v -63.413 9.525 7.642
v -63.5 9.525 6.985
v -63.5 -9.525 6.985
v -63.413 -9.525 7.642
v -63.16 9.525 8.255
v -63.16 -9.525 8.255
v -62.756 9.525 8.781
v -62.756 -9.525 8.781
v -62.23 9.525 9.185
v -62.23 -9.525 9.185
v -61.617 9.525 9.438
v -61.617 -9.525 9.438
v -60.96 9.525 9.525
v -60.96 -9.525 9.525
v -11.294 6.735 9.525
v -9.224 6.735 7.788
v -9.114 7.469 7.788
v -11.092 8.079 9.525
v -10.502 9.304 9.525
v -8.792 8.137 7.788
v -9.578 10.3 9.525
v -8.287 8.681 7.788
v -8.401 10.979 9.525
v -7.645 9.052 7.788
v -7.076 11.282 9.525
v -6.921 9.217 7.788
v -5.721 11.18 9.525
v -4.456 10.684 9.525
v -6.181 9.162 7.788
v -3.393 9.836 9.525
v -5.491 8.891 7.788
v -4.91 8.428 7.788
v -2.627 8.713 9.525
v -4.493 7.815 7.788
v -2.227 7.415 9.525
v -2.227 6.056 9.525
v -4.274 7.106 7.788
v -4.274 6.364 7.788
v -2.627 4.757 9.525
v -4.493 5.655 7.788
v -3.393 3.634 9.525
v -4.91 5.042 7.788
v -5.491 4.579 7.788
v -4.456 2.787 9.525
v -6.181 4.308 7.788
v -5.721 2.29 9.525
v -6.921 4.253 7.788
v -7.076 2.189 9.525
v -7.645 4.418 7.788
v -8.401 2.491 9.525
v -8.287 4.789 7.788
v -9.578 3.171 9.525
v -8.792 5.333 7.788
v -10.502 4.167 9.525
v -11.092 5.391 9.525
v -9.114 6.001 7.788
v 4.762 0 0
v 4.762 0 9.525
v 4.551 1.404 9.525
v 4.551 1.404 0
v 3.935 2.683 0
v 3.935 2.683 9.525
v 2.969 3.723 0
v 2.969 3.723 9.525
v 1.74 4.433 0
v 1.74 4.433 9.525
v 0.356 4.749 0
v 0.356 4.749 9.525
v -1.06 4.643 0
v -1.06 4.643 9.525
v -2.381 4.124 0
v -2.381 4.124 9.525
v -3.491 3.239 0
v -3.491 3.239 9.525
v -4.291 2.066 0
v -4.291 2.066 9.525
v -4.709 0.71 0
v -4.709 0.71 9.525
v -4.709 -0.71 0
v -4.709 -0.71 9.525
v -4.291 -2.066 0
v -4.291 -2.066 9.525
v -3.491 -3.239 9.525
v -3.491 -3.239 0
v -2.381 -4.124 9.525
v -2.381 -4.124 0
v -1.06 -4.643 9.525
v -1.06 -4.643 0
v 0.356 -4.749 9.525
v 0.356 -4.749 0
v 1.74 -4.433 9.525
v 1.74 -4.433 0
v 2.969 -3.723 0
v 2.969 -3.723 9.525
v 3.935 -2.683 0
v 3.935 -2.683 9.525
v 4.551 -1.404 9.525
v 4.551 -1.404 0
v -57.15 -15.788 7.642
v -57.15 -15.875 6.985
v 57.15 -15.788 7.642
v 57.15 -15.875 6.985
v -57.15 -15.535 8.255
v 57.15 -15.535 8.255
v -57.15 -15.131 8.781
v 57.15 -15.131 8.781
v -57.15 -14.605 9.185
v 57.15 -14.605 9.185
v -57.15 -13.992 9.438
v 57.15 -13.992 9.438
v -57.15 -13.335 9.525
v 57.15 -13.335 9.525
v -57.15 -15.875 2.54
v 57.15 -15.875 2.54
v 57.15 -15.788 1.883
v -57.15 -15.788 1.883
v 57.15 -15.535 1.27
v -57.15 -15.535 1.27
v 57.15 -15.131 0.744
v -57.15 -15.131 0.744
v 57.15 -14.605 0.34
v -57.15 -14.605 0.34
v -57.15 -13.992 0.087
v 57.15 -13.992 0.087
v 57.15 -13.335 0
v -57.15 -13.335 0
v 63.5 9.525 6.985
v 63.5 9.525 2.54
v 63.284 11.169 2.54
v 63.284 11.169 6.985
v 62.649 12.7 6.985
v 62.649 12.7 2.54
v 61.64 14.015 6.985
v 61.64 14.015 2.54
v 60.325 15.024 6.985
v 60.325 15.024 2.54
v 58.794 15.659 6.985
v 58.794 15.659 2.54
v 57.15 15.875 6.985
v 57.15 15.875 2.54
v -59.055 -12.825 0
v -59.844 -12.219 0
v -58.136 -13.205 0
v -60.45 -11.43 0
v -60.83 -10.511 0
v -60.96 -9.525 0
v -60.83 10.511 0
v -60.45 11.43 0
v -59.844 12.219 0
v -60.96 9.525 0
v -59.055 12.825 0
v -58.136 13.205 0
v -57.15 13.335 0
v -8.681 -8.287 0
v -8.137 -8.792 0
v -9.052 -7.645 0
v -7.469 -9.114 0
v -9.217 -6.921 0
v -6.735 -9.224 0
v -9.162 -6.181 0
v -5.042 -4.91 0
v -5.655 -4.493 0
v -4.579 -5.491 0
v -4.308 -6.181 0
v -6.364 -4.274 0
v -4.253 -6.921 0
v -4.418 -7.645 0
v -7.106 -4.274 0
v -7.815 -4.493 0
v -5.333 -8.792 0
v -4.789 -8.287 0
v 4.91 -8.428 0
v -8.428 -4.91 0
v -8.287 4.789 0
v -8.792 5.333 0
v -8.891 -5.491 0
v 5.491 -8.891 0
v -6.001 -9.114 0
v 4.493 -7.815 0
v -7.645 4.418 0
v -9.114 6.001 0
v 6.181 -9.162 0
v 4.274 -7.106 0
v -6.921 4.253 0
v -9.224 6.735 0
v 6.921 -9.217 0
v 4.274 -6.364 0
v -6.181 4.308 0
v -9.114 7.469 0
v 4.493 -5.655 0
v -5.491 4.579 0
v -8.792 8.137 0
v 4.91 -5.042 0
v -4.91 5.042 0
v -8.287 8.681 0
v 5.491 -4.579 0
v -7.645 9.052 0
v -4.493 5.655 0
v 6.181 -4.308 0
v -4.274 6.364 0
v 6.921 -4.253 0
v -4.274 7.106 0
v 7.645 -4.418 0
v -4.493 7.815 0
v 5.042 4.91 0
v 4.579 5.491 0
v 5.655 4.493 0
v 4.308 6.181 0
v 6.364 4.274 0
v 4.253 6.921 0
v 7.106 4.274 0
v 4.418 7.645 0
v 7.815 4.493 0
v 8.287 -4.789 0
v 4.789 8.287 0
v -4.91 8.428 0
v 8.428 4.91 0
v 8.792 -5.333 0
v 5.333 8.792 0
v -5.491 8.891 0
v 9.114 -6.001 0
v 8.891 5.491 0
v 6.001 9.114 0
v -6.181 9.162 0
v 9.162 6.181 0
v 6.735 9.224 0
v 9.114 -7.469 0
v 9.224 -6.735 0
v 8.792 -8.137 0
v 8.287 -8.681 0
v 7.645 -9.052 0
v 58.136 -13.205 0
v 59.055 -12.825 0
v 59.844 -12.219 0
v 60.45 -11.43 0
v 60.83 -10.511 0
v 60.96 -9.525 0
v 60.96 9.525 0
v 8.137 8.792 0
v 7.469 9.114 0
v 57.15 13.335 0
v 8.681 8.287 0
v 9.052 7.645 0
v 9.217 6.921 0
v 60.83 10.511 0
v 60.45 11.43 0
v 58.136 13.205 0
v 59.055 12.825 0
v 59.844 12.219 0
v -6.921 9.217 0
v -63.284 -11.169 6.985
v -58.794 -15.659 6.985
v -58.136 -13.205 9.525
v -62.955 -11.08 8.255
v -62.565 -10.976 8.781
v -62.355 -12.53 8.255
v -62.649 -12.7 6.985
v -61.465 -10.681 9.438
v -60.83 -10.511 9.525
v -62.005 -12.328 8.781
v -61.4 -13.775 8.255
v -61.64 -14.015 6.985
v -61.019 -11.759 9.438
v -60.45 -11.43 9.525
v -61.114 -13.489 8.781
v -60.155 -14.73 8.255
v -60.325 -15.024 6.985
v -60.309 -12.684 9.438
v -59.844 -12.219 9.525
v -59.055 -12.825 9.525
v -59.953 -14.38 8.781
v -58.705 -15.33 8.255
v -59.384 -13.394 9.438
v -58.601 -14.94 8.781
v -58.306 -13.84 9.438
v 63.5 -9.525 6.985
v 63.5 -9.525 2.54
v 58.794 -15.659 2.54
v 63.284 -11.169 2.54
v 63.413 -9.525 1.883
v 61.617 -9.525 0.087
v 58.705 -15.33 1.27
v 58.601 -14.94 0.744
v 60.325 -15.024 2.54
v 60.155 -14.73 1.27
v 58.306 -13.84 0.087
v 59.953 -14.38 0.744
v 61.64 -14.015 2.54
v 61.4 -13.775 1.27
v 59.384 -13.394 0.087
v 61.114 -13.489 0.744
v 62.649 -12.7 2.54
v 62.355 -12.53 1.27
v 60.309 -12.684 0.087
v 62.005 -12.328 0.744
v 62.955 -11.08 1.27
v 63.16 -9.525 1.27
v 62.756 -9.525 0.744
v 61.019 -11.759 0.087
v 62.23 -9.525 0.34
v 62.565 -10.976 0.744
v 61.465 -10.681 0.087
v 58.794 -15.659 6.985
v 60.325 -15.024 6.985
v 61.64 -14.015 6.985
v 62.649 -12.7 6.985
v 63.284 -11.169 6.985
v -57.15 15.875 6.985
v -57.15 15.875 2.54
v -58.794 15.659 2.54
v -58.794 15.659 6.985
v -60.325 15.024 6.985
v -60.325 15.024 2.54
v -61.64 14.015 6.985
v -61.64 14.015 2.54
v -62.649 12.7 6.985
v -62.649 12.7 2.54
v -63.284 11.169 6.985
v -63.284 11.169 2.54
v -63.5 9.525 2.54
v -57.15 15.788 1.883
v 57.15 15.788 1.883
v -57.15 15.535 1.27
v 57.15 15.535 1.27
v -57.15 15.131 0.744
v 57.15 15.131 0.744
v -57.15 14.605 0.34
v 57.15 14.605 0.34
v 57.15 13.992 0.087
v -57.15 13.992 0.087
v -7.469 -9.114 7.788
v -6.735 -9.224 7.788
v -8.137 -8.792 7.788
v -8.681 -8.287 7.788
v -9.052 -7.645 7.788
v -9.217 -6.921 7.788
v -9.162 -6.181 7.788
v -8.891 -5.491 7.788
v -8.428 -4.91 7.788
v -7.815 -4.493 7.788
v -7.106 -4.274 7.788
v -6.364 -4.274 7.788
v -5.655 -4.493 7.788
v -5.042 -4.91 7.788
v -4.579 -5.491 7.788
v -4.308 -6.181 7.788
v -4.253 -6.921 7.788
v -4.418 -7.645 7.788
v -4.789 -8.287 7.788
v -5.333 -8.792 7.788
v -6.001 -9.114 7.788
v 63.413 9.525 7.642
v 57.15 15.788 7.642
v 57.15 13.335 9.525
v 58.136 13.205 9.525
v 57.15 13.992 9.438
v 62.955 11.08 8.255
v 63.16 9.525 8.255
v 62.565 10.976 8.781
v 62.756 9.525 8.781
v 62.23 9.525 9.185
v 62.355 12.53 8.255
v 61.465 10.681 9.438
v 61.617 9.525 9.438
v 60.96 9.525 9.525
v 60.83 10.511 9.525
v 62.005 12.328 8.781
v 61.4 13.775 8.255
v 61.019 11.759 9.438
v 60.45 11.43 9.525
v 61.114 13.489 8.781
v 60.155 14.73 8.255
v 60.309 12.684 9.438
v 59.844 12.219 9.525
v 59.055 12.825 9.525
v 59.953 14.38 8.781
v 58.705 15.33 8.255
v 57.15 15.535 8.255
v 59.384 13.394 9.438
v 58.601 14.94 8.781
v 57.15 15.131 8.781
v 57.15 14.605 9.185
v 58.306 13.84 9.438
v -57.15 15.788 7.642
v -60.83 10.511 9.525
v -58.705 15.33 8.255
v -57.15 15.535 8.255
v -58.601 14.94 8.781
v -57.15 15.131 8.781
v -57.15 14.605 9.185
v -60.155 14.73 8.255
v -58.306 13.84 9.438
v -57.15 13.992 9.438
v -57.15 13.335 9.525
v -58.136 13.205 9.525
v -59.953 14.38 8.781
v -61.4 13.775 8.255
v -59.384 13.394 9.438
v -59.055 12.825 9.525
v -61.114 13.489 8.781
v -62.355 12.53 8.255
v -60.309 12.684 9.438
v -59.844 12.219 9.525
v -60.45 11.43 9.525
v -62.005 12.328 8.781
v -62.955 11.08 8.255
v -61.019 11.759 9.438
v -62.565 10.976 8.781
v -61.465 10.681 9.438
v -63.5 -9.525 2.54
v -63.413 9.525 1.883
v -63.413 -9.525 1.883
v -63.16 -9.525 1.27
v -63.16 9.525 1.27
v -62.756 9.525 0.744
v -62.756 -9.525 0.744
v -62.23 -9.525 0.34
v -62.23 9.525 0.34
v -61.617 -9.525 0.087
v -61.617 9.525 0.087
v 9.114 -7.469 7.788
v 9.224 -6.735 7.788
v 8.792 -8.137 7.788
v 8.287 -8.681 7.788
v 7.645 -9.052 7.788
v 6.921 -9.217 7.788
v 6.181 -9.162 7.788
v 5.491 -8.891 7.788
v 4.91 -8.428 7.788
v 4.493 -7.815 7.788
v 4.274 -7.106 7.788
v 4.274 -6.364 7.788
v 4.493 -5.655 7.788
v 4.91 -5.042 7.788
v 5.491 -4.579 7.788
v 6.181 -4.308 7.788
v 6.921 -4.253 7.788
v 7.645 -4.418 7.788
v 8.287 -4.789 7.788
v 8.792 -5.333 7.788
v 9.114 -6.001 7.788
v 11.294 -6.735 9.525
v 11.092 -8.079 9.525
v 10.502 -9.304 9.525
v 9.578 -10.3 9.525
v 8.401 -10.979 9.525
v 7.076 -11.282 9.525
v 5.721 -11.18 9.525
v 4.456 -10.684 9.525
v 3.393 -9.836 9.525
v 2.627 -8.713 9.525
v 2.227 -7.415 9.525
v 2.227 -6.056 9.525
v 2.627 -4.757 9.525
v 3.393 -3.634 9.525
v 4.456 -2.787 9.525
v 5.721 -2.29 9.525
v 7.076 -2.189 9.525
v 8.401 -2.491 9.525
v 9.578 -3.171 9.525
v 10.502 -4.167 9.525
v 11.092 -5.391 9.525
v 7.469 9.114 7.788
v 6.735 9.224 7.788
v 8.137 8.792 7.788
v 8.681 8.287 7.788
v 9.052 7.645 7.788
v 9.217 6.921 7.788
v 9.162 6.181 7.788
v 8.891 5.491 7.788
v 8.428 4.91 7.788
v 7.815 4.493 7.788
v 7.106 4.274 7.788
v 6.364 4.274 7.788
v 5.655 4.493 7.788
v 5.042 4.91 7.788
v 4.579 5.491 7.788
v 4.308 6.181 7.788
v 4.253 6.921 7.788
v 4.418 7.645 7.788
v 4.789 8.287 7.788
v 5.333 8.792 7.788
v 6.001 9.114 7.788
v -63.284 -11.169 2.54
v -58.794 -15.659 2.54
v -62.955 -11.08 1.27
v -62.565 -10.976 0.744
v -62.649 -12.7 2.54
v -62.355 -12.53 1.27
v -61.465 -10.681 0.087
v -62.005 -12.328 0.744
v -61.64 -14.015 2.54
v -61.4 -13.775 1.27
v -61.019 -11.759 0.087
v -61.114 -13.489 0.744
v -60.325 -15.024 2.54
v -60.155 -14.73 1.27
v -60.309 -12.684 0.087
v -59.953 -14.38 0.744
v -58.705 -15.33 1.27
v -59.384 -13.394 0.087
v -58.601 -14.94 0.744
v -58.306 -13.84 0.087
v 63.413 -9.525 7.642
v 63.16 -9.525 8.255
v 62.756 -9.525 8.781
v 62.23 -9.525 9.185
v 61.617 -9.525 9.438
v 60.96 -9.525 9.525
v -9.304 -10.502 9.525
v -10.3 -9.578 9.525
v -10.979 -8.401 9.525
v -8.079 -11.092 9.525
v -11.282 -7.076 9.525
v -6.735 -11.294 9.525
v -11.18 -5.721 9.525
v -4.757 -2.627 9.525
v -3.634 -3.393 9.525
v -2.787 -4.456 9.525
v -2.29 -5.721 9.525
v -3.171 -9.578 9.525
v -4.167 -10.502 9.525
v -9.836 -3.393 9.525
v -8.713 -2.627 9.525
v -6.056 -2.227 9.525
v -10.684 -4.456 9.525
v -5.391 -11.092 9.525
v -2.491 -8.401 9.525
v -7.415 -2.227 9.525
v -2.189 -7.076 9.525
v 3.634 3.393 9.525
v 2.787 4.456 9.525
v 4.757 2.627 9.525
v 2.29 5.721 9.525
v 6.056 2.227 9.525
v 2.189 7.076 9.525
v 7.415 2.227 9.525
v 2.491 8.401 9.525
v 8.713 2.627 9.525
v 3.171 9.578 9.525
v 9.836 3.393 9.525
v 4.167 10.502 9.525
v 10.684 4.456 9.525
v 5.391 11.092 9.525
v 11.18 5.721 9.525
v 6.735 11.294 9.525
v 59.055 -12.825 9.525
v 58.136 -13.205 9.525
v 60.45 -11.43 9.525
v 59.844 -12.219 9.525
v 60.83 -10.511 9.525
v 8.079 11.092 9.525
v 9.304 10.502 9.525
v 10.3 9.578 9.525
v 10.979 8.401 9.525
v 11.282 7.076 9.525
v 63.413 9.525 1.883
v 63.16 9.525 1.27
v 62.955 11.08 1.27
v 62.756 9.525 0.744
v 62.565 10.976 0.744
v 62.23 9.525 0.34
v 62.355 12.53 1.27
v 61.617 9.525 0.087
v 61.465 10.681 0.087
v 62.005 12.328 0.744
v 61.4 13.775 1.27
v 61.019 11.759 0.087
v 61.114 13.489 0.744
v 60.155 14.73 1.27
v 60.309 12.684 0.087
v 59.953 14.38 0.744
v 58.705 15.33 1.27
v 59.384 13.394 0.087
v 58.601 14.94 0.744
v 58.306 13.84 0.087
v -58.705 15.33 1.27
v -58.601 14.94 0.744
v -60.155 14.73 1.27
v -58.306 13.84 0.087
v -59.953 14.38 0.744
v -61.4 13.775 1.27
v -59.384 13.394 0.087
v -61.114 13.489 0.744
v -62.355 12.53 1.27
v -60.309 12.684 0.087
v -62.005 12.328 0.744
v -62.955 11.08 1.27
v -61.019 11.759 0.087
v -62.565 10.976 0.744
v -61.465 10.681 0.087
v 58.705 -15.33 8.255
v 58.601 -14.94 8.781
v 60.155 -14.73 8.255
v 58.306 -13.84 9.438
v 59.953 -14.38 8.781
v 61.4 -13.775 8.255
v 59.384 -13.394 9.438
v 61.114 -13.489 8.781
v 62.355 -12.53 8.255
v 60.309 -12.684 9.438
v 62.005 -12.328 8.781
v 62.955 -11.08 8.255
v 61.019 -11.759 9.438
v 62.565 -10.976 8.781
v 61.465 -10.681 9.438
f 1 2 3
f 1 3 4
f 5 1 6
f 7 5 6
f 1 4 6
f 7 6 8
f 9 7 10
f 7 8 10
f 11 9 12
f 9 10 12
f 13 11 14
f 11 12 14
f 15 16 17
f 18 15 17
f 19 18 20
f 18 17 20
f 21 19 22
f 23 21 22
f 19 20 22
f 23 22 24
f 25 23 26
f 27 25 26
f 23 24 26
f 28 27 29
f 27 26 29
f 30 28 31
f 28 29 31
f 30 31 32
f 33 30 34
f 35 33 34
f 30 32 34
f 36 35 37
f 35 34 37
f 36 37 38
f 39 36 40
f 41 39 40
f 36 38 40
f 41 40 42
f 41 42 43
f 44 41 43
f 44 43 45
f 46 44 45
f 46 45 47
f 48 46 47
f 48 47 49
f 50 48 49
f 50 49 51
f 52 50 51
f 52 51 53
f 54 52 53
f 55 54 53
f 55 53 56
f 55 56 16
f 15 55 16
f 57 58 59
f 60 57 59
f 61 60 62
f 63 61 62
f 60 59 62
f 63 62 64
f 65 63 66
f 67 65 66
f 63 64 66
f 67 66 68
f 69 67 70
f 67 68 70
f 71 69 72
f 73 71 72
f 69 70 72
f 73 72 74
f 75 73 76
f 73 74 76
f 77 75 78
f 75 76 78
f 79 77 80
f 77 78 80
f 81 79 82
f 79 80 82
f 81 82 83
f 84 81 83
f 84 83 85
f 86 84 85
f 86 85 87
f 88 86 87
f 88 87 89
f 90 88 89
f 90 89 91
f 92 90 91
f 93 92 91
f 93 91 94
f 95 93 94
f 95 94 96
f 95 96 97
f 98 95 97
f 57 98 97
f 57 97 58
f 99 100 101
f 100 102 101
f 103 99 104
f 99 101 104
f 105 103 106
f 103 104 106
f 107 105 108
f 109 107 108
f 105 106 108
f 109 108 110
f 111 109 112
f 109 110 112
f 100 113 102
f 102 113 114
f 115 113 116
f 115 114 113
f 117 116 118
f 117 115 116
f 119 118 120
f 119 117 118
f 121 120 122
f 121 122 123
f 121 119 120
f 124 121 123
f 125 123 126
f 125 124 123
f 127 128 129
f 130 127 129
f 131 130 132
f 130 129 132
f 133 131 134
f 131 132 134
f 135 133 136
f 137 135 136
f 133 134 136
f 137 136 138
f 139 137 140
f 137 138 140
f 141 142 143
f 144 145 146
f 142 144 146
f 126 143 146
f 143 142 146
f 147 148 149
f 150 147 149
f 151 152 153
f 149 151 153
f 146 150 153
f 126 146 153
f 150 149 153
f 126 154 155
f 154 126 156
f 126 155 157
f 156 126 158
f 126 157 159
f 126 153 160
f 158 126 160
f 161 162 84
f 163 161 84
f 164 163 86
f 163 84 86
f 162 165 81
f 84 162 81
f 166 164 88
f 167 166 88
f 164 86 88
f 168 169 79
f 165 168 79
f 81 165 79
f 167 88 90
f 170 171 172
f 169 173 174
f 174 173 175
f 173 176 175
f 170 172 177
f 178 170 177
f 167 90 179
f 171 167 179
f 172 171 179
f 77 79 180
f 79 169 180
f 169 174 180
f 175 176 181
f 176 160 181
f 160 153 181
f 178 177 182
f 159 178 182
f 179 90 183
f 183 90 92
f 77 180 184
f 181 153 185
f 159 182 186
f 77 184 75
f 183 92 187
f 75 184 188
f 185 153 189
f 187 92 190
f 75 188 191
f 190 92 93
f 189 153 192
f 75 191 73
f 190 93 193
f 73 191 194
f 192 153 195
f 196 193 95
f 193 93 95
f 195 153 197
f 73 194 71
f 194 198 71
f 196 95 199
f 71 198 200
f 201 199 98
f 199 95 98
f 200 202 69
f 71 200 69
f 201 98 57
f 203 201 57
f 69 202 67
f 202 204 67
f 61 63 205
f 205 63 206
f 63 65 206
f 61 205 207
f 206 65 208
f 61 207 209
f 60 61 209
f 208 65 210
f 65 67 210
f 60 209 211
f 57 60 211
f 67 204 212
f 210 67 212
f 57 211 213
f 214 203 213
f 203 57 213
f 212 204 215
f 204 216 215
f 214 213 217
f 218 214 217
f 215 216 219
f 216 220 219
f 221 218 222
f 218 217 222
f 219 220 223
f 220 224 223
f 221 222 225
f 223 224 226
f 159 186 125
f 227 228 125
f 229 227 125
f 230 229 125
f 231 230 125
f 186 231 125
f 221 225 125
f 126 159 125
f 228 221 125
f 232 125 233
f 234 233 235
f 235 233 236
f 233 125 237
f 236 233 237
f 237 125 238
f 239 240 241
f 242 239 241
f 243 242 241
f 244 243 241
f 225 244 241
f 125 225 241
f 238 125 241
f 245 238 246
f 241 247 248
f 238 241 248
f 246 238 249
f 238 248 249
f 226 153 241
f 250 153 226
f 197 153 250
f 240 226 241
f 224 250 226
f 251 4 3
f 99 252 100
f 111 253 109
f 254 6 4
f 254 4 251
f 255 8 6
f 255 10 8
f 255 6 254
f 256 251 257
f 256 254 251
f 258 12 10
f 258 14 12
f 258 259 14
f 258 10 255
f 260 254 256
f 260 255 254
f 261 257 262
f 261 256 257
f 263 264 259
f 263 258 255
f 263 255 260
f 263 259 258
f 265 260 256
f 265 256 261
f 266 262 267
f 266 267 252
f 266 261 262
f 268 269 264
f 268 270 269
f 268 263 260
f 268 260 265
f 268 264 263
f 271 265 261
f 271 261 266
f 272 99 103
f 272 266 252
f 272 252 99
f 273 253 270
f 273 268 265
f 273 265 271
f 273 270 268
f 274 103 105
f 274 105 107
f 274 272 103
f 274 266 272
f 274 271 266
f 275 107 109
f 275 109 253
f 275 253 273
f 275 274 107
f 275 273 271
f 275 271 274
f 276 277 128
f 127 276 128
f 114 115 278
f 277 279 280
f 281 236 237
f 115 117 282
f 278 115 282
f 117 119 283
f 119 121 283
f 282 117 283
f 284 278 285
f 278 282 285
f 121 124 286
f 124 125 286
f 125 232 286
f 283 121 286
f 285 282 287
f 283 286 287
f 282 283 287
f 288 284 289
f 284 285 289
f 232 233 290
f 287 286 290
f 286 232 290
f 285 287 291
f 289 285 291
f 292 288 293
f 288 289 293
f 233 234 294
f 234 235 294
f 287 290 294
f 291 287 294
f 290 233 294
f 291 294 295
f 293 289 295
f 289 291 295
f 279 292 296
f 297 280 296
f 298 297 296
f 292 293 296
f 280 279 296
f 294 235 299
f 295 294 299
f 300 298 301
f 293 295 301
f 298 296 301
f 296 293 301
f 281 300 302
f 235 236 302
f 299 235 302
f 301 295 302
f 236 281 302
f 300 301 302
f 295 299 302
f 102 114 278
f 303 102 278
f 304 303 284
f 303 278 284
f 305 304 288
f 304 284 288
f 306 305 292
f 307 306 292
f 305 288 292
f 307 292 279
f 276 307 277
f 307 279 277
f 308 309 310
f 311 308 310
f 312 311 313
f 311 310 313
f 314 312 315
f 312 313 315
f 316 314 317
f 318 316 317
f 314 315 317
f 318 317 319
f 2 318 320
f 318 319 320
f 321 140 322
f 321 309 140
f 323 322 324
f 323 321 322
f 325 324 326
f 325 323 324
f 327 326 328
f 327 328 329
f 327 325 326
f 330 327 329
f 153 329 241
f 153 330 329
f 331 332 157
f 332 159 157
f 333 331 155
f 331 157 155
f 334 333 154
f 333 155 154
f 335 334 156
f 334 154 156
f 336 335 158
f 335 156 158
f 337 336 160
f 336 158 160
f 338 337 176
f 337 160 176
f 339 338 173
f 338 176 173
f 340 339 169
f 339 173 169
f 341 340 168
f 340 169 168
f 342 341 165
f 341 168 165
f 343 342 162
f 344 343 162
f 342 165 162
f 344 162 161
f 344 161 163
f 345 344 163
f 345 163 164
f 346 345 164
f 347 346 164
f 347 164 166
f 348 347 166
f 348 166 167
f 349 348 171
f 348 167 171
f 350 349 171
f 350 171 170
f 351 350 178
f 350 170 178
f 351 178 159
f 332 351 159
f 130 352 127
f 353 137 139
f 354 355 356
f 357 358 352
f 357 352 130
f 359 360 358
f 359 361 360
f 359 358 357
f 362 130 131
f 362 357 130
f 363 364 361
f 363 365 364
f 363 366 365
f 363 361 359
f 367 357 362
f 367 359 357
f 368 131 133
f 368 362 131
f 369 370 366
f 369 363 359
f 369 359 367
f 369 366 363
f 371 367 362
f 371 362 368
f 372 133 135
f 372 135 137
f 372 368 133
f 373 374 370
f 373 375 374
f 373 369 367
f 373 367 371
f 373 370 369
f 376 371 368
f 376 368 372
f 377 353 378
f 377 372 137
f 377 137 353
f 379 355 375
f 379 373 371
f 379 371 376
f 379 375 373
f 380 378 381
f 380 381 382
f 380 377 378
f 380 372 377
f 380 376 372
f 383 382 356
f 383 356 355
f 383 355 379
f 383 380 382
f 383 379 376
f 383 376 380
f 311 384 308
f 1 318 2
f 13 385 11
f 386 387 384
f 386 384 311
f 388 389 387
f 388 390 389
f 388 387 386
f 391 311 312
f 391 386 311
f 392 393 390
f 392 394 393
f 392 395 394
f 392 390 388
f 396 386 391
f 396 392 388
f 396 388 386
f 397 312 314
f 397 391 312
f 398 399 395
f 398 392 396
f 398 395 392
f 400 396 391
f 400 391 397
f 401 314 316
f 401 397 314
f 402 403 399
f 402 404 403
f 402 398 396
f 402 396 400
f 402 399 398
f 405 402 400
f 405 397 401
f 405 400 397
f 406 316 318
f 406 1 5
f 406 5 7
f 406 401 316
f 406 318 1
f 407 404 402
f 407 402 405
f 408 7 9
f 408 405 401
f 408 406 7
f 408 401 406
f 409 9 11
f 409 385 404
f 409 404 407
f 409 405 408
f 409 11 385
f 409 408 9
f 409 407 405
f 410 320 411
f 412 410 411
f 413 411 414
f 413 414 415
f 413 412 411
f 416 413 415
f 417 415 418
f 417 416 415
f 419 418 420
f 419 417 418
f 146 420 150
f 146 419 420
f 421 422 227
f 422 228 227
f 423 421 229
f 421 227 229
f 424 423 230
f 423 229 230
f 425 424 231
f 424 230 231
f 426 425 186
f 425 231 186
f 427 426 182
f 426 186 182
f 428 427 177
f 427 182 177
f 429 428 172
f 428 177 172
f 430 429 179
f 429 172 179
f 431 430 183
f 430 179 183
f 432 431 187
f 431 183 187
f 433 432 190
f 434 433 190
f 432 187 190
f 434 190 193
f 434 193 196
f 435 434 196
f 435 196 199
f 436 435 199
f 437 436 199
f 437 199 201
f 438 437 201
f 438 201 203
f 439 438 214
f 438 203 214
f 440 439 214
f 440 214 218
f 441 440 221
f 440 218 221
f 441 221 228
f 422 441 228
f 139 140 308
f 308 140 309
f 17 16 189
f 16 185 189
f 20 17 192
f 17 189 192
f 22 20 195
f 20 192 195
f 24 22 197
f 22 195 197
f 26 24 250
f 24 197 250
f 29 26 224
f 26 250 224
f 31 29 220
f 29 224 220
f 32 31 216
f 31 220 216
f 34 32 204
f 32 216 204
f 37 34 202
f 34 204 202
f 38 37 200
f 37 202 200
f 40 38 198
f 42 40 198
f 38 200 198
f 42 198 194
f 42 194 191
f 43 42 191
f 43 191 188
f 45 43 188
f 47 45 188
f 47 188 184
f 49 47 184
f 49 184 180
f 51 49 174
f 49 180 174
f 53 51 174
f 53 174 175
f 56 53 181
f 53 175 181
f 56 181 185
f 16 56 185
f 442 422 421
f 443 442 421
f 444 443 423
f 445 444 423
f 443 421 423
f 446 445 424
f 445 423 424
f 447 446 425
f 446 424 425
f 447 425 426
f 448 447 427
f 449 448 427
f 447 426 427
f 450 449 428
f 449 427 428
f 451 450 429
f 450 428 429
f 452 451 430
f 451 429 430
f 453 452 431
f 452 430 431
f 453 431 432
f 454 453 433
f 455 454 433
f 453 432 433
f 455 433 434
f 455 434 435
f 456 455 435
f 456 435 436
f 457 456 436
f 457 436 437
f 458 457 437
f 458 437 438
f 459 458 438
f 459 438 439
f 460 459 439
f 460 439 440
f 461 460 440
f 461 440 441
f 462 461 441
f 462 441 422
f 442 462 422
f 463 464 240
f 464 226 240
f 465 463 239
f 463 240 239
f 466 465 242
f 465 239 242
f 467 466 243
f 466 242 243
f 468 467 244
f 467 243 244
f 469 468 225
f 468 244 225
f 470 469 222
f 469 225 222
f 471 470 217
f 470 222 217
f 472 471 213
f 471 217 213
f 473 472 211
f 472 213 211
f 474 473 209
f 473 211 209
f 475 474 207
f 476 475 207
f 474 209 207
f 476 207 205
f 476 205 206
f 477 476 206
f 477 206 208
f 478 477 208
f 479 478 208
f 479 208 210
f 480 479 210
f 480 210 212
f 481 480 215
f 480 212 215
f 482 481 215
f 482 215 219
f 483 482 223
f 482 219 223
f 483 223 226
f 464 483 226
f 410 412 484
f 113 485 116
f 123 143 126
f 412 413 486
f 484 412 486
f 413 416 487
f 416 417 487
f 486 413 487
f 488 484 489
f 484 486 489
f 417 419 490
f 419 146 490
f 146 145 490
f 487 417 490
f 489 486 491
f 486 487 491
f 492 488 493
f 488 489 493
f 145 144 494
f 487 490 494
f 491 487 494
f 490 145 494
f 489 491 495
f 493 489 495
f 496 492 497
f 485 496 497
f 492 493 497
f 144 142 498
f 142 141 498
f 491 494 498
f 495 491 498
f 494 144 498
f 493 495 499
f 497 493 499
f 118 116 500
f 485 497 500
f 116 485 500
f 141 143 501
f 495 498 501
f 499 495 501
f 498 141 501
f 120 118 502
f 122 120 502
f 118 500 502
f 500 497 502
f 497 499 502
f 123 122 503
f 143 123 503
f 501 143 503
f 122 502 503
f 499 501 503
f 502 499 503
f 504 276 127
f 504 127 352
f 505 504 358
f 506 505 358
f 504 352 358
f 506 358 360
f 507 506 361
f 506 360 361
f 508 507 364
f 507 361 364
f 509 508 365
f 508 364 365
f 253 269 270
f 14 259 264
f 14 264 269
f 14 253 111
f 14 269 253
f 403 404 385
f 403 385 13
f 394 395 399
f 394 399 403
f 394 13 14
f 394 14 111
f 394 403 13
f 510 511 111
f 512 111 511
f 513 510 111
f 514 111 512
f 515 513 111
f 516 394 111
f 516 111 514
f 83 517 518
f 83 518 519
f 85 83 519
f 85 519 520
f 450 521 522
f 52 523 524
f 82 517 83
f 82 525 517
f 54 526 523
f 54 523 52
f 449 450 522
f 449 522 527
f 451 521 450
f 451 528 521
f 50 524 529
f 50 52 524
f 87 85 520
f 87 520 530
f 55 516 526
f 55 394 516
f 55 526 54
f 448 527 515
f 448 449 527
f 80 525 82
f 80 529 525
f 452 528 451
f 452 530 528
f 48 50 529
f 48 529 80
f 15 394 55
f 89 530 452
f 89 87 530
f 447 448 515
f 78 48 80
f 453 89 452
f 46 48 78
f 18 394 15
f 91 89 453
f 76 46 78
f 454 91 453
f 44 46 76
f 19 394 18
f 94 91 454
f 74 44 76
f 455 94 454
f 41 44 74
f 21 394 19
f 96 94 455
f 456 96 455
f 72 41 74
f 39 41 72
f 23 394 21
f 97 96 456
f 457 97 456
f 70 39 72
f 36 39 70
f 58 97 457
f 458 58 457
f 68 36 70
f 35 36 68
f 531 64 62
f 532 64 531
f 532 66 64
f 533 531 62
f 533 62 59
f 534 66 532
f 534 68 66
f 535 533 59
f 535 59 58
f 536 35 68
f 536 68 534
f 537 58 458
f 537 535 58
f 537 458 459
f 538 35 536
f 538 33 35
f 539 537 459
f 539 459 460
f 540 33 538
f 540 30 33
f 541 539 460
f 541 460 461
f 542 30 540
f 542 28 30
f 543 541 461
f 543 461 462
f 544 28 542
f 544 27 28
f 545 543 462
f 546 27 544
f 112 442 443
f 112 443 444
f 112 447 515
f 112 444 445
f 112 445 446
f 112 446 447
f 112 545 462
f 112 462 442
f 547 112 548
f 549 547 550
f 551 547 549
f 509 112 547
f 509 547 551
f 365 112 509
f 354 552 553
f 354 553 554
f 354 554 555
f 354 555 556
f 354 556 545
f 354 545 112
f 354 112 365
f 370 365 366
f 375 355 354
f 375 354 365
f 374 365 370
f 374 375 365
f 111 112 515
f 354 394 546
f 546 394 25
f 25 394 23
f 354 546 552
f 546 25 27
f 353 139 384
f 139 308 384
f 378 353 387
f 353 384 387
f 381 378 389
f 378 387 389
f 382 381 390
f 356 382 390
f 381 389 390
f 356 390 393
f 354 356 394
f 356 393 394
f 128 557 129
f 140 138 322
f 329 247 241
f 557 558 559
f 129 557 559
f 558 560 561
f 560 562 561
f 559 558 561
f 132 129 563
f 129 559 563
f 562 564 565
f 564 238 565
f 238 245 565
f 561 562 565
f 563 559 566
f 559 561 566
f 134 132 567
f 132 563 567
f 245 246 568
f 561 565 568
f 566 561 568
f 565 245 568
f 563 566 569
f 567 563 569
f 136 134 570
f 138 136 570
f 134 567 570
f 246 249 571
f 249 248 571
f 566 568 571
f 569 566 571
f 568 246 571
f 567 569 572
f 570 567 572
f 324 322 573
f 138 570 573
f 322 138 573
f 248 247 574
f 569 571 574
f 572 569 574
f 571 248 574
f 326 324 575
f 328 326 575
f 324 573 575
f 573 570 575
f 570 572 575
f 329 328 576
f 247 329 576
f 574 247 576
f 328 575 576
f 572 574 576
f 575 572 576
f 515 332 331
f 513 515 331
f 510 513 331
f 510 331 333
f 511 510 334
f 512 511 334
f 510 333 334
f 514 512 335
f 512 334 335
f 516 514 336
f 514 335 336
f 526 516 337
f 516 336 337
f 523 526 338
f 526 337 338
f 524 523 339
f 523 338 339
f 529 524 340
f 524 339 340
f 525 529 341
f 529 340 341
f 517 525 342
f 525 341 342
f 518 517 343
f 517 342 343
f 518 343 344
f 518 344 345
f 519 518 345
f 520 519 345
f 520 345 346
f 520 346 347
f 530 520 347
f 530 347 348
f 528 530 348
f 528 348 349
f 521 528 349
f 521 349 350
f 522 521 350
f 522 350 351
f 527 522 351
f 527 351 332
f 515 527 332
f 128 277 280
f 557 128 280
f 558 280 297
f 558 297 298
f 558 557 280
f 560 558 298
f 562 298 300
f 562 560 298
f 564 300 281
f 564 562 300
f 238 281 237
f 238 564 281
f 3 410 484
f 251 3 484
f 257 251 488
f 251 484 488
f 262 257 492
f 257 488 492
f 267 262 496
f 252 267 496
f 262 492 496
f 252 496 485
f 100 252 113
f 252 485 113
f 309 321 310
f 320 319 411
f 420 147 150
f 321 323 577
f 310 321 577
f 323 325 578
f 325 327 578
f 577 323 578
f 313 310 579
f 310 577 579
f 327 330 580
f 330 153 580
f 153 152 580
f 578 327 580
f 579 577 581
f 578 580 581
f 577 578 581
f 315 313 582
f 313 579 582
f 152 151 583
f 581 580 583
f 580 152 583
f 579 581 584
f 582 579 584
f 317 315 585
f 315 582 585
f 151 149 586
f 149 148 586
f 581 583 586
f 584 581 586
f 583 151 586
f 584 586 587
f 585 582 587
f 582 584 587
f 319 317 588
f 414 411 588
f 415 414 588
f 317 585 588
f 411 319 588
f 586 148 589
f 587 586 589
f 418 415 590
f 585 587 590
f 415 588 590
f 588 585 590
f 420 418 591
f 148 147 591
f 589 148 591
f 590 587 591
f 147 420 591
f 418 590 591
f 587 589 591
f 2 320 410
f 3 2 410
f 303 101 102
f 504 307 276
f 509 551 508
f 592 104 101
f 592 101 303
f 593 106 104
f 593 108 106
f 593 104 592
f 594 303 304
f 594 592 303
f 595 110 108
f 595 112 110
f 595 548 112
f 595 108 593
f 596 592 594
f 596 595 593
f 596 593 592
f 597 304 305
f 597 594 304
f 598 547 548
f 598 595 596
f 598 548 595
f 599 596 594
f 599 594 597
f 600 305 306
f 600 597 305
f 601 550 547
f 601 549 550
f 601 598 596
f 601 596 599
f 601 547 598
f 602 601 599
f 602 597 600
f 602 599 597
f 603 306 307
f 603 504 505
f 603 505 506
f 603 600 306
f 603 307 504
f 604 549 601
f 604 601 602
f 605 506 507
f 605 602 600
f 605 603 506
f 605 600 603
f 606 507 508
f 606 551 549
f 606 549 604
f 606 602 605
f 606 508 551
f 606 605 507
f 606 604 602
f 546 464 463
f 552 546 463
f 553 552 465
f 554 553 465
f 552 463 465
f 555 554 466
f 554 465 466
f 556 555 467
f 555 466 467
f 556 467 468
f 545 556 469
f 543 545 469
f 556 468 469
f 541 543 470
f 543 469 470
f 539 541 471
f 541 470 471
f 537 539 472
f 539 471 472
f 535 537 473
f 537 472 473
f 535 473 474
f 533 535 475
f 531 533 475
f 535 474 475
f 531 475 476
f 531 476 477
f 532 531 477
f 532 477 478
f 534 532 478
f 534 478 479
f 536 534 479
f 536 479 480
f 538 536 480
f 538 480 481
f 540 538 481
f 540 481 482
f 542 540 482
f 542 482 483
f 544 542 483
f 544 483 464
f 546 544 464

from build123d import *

# Parameters (mm, degrees)
F1_DEPTH        = 9.525
F2_R            = 2.54
F3_R            = 4.7625
F4_DEPTH        = 25.4
F6_D            = 4.9784
F6_CSINK_D      = 9.1186
F6_CSINK_ANGLE  = 100
F6_COPIES_COUNT = 4


# Not quite as in the source:
# - a pattern or mirror of a feature is missing from the dataset's text; its kind, count and spacing are read off the source's solid


with BuildPart() as f1:
    # F0 (on Top) → F1 (new body)
    with BuildSketch(Plane.XY):
        with BuildLine():
            Line((-57.15, -15.875), (57.15, -15.875))
            ThreePointArc((57.15, -15.875), (61.6401280605, -14.0151280605), (63.5, -9.525))
            Line((63.5, -9.525), (63.5, 9.525))
            ThreePointArc((63.5, 9.525), (61.6401280605, 14.0151280605), (57.15, 15.875))
            Line((57.15, 15.875), (-57.15, 15.875))
            ThreePointArc((-57.15, 15.875), (-61.6401280605, 14.0151280605), (-63.5, 9.525))
            Line((-63.5, 9.525), (-63.5, -9.525))
            ThreePointArc((-63.5, -9.525), (-61.6401280605, -14.0151280605), (-57.15, -15.875))
        make_face()
    extrude(amount=F1_DEPTH)

    # F2
    f2_edges = [f1.edges().sort_by_distance(p)[0] for p in [
        (0, -15.875, 9.525),
        (61.640128, -14.015128, 9.525),
        (63.5, 0, 9.525),
        (61.640128, 14.015128, 9.525),
        (0, 15.875, 9.525),
        (-61.640128, 14.015128, 9.525),
        (-63.5, 0, 9.525),
        (-61.640128, -14.015128, 9.525),
        (0, -15.875, 0),
        (61.640128, -14.015128, 0),
        (63.5, 0, 0),
        (61.640128, 14.015128, 0),
        (0, 15.875, 0),
        (-61.640128, 14.015128, 0),
        (-63.5, 0, 0),
        (-61.640128, -14.015128, 0),
    ]]
    fillet(f2_edges, radius=F2_R)

    # F3 (on face) → F4 (cut)
    with BuildSketch(Plane.XY.offset(9.525)):
        Circle(F3_R)
    extrude(amount=-F4_DEPTH, mode=Mode.SUBTRACT)

    # F6 (through all)
    with Locations(Plane.XY.offset(9.525)):
        with Locations((-6.7351920908, 6.7351920908)):
            f6 = CounterSinkHole(F6_D / 2, F6_CSINK_D / 2, counter_sink_angle=F6_CSINK_ANGLE)

    # F6_copies: F6 ×4 about axis
    f6_copies_axis = Axis((0, 0, 0), (0, 0, 1))
    for i in range(1, F6_COPIES_COUNT):
        add(f6.rotate(f6_copies_axis, i * 360 / F6_COPIES_COUNT), mode=Mode.SUBTRACT)


solid = f1.part
